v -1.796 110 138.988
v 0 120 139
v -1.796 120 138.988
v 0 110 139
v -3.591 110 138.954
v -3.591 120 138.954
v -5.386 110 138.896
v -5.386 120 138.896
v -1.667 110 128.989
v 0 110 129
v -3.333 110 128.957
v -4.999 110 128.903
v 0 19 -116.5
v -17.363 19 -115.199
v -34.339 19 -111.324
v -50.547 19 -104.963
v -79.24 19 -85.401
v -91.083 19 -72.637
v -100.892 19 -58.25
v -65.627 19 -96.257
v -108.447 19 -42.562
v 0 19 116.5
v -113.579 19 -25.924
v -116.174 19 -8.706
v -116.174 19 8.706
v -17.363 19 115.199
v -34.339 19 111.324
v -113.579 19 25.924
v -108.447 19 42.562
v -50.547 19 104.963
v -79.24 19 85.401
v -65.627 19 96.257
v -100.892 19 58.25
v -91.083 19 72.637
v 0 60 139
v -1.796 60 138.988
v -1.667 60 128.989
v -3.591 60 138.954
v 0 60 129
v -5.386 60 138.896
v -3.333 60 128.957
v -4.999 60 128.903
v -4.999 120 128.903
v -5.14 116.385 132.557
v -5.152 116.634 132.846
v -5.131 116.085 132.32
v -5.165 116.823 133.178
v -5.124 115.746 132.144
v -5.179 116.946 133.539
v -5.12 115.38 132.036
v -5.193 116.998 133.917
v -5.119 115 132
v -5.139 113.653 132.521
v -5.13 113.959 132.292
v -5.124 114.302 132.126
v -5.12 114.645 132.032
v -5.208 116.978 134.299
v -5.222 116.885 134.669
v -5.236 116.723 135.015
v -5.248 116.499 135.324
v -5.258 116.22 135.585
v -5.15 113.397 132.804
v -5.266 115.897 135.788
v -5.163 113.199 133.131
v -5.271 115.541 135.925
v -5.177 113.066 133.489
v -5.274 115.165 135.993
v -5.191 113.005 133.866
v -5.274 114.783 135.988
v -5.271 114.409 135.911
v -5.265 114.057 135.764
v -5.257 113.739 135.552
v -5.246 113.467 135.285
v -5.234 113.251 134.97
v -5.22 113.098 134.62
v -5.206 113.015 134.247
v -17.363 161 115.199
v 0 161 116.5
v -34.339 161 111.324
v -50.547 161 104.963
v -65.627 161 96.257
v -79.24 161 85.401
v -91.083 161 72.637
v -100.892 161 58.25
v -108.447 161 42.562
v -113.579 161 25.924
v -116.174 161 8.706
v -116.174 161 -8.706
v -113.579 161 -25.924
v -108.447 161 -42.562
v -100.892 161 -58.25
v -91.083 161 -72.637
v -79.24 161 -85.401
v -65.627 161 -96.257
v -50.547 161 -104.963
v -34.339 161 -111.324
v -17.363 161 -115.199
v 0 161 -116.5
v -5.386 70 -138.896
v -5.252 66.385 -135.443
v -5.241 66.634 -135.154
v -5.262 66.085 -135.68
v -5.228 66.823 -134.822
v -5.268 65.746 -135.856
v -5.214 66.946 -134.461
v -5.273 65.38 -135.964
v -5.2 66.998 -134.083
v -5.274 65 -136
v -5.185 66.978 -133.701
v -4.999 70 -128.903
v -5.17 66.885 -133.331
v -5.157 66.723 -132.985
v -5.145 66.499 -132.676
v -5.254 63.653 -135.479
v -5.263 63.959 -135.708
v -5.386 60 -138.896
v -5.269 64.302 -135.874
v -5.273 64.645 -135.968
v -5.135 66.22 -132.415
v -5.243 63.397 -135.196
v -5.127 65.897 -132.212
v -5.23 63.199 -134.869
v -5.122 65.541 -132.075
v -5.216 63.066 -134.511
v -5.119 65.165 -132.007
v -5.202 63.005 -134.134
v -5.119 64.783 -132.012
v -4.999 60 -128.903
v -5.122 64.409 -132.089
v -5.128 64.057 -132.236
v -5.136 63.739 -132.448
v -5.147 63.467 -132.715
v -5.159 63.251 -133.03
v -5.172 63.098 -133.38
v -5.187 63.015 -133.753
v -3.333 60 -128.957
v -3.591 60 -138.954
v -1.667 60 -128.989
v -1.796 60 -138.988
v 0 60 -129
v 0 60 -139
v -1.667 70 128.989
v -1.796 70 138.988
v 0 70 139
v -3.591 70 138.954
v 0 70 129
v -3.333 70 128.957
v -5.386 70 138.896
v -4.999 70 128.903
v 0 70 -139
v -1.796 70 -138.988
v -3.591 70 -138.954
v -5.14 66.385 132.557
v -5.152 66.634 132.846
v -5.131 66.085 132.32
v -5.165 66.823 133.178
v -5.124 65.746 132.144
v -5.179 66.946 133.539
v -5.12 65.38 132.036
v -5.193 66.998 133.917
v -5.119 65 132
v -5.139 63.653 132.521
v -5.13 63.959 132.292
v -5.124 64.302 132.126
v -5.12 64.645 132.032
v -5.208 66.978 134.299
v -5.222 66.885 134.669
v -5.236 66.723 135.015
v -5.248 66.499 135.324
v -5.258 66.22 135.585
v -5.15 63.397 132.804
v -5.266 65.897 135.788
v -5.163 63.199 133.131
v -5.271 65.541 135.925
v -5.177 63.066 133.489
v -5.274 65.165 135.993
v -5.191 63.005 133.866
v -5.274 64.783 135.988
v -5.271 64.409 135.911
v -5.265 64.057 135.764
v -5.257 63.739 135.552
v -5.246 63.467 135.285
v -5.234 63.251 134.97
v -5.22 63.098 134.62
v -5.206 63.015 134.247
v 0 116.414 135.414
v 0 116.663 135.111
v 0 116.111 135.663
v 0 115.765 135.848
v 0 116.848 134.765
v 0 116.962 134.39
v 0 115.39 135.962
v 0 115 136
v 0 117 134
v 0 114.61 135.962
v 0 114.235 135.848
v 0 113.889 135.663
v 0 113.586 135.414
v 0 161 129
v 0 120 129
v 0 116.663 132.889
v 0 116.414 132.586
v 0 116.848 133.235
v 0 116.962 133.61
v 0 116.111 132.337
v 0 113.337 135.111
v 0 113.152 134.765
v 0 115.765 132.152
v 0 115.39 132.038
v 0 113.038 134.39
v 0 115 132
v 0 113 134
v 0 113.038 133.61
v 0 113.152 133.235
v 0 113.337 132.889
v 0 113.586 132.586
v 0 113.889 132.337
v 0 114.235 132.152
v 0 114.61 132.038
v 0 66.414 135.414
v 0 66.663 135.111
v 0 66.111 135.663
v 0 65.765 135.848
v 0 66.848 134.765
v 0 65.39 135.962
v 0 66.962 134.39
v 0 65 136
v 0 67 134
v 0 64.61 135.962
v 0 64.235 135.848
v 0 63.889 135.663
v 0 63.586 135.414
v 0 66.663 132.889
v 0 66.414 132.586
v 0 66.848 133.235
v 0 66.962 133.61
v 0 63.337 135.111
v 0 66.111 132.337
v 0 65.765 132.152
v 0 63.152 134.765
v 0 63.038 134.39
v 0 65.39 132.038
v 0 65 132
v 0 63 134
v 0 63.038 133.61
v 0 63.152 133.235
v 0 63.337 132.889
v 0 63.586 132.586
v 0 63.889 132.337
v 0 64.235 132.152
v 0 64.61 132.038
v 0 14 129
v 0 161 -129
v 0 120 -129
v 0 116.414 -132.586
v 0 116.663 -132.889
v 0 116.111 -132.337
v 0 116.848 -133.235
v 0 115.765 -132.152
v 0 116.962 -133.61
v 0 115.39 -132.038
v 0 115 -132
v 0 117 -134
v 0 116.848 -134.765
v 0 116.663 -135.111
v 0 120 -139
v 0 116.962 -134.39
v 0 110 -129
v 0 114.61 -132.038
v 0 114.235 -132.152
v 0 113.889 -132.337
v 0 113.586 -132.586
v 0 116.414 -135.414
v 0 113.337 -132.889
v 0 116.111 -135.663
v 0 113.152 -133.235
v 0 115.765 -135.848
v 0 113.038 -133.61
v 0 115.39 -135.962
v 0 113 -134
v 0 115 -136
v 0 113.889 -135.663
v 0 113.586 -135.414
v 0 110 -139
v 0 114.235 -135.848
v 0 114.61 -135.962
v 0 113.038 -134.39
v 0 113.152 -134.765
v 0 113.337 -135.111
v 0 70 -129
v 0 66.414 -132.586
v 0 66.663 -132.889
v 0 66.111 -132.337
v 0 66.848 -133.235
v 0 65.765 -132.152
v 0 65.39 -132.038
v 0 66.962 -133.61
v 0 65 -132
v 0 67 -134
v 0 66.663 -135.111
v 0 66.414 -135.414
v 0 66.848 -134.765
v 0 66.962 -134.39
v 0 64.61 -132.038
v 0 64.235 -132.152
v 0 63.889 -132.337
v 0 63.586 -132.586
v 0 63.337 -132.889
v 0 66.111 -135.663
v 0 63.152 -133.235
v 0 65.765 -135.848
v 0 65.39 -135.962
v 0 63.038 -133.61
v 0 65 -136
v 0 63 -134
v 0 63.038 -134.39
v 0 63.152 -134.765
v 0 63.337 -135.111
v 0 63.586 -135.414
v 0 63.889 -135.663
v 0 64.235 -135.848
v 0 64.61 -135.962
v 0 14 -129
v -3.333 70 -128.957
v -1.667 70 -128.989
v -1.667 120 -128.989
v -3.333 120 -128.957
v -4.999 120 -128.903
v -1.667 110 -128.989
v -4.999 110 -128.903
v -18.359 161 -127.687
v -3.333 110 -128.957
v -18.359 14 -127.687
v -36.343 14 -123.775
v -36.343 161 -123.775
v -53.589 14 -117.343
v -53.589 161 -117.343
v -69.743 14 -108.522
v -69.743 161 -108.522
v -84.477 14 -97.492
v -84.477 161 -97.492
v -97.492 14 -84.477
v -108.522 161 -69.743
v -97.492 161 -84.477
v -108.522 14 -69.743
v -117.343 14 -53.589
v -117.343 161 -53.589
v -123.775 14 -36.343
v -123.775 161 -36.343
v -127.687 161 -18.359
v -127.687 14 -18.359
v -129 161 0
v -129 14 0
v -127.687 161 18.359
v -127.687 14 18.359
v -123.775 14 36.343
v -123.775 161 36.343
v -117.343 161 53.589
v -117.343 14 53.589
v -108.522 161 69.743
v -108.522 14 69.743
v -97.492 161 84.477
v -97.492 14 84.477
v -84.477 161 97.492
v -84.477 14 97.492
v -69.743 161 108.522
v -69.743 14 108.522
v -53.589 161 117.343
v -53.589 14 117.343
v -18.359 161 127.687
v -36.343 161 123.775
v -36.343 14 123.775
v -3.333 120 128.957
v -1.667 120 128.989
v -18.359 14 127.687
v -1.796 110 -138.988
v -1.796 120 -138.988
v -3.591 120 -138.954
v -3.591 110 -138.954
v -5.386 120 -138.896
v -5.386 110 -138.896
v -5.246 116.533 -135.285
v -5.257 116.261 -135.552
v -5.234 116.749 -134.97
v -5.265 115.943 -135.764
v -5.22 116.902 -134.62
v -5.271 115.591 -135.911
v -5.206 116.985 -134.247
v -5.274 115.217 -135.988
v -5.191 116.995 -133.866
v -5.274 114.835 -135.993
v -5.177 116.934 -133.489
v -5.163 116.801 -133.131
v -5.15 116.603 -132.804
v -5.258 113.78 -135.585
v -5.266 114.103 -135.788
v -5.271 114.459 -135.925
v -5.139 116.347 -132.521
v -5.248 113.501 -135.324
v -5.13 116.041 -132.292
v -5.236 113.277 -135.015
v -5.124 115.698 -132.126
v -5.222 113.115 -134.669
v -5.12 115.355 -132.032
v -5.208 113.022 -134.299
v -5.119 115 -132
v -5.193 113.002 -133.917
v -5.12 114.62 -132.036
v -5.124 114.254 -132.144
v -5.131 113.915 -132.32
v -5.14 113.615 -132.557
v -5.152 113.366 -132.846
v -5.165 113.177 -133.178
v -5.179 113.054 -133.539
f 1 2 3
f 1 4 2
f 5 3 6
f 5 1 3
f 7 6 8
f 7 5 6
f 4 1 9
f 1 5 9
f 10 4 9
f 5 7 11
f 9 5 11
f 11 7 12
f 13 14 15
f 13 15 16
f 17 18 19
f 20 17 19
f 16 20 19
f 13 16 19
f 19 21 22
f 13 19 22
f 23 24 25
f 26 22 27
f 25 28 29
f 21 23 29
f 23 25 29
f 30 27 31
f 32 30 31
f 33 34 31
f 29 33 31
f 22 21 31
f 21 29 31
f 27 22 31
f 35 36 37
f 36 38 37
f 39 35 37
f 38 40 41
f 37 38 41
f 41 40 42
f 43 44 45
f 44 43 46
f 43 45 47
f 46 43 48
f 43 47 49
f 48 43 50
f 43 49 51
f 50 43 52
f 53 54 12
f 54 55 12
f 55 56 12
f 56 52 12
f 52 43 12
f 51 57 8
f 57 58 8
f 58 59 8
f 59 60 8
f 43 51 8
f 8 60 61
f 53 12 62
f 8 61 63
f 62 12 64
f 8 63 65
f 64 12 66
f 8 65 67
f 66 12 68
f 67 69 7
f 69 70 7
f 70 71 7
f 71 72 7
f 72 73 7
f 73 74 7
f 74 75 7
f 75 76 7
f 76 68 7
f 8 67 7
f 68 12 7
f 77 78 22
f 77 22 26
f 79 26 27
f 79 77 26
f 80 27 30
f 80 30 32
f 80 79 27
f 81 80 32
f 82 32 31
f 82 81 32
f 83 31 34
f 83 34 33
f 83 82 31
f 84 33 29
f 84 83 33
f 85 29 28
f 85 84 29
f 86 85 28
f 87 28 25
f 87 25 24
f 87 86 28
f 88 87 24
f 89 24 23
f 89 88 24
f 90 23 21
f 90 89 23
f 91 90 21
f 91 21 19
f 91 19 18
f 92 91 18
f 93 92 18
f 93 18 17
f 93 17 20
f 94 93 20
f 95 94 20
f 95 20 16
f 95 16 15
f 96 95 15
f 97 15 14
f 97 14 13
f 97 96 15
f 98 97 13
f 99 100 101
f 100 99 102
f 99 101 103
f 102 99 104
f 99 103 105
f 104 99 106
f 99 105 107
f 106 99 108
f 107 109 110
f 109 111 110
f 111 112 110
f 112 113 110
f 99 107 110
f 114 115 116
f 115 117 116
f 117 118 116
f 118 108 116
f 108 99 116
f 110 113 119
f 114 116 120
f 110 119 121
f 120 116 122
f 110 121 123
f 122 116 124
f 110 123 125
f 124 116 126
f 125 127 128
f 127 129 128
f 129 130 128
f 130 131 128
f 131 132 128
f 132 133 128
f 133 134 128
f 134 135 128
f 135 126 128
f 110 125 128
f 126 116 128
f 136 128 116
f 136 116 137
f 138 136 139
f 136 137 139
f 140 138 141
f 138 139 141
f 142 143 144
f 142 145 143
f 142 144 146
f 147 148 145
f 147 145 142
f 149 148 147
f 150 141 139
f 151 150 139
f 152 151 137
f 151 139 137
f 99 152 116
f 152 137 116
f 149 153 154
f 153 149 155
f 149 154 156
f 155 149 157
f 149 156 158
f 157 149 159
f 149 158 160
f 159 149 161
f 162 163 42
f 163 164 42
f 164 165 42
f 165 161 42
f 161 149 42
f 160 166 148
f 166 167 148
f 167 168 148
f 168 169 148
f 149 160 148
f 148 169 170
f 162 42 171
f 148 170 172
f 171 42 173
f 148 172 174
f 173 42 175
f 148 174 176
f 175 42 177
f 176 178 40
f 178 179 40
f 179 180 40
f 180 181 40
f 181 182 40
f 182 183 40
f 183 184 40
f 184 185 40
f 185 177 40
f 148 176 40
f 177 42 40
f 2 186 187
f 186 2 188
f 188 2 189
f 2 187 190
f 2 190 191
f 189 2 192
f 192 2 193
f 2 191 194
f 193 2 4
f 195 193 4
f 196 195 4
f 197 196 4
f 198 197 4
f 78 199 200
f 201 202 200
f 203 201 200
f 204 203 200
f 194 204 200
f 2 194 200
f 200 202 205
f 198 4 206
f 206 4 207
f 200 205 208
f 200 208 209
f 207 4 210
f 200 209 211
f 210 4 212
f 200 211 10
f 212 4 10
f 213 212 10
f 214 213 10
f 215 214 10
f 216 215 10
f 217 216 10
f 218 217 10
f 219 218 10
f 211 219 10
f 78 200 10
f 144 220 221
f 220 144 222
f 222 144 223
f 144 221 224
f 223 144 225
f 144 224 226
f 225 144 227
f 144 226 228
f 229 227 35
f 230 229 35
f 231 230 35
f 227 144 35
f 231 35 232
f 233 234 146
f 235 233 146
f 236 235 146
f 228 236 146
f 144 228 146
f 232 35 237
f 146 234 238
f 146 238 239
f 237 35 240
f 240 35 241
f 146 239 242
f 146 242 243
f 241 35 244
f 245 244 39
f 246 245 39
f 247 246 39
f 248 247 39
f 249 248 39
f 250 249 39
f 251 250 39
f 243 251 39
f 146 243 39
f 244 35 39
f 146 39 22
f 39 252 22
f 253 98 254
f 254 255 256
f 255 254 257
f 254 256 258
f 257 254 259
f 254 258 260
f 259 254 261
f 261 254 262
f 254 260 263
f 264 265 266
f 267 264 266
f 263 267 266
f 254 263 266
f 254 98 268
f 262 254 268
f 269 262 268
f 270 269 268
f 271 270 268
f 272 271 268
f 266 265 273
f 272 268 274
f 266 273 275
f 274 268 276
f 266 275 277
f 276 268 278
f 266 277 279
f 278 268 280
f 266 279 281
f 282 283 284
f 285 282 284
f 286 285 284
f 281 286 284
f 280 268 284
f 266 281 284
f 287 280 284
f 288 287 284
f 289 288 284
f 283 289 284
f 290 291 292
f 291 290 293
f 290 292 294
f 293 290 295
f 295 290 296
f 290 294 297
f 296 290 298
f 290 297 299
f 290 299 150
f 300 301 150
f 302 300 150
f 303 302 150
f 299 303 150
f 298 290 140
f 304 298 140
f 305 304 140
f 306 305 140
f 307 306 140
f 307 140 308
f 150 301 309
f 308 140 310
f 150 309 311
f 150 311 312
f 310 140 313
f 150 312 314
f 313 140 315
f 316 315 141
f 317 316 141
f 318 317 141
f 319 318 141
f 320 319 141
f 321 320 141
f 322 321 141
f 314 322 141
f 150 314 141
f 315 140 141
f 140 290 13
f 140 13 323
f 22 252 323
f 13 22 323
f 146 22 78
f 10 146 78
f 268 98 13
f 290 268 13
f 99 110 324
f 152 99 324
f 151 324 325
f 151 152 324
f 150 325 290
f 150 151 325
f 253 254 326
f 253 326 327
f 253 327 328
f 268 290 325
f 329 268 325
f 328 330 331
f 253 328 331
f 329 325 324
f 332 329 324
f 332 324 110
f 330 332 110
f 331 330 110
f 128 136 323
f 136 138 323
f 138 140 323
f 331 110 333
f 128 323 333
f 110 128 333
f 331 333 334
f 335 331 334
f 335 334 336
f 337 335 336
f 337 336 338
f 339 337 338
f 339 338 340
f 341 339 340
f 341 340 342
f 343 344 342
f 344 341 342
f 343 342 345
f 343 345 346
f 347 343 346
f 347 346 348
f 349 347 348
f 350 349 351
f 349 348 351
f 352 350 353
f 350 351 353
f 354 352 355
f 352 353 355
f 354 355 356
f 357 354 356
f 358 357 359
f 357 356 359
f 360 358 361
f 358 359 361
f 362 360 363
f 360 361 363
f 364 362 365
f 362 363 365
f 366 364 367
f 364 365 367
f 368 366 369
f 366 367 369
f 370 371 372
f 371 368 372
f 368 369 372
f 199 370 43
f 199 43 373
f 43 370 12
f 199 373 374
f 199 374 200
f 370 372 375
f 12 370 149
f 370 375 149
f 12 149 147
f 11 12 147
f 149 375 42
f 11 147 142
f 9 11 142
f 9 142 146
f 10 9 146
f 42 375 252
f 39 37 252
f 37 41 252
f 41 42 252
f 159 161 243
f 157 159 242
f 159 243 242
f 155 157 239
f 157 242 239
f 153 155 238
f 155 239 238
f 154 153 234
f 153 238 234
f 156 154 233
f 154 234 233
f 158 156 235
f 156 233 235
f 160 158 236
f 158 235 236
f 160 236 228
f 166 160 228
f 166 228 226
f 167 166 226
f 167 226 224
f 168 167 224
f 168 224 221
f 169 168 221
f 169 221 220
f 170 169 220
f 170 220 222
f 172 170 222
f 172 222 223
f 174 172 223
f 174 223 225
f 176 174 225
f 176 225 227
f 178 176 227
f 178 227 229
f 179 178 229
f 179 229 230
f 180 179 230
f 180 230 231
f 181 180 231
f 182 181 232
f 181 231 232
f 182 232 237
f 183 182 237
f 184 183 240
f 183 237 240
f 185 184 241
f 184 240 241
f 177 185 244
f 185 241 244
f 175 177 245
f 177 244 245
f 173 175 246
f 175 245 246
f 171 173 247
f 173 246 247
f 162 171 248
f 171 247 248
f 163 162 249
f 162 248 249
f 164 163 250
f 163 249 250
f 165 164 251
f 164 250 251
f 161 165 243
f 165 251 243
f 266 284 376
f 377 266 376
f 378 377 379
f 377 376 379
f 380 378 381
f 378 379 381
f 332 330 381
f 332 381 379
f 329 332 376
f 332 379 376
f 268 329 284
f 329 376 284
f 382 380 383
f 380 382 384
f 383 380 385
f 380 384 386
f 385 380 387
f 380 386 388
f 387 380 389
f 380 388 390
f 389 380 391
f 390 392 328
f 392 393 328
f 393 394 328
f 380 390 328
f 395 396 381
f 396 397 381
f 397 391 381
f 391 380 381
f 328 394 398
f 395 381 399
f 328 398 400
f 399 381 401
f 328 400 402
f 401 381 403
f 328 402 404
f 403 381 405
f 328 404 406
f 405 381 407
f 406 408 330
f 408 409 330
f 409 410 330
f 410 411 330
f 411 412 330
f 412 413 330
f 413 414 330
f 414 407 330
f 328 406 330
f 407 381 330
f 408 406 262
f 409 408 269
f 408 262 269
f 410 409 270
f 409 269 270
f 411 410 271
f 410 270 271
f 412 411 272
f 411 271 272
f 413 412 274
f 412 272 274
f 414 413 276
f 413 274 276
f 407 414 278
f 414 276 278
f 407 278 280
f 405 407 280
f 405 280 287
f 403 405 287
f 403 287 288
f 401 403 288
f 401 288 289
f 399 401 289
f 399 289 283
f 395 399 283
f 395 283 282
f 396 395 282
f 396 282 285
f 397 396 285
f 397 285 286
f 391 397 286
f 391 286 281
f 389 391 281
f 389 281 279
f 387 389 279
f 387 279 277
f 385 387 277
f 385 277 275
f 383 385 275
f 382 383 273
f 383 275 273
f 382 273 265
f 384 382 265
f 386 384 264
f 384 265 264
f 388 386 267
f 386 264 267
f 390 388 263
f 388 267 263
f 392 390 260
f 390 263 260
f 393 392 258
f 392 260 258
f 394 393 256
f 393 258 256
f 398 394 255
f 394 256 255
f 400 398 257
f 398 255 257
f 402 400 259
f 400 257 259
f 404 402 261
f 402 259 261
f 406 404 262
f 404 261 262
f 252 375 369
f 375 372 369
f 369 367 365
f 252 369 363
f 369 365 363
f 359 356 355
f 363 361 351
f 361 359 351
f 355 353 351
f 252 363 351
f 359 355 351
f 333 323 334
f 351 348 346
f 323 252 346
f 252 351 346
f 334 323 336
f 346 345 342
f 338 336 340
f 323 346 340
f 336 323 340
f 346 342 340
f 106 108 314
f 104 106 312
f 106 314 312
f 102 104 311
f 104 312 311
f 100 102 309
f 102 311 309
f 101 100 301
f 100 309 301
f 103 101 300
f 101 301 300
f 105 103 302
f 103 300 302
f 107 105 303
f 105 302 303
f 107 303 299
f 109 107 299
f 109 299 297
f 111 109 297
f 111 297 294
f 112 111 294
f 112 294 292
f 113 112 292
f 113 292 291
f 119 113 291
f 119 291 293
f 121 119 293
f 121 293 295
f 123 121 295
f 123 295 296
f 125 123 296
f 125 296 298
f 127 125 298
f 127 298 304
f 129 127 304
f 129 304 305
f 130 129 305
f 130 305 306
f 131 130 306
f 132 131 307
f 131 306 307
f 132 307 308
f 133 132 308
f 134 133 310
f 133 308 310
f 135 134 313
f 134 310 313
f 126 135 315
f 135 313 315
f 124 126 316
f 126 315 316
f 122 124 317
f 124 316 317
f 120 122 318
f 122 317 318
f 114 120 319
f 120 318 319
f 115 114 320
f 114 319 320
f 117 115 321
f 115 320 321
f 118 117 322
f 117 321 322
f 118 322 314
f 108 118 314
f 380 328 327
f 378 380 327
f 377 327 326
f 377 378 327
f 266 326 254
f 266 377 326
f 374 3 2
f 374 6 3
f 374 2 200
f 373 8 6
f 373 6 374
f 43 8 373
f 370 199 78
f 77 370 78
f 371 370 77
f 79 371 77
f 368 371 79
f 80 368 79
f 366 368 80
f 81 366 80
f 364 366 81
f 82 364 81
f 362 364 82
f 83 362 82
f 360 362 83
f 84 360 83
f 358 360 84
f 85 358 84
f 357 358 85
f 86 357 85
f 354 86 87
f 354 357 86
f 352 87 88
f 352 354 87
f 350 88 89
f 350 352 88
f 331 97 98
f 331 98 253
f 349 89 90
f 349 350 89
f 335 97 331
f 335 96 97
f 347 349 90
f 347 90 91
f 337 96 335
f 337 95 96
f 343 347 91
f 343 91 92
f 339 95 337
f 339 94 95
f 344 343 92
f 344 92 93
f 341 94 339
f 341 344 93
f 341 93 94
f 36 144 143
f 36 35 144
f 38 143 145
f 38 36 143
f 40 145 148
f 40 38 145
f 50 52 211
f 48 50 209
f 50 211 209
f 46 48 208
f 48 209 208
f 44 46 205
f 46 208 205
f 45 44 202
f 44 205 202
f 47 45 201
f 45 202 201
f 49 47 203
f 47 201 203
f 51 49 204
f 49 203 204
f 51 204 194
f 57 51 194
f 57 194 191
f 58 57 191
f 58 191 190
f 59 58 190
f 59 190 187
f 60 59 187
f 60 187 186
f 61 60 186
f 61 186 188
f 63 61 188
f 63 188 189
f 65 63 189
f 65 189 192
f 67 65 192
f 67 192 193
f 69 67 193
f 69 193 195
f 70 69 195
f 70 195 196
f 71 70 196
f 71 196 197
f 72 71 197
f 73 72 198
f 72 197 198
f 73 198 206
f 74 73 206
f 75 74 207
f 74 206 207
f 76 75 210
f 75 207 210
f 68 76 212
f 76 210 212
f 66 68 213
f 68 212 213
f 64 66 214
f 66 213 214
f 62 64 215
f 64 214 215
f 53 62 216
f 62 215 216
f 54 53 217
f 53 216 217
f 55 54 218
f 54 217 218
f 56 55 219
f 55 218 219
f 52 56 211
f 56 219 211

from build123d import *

# Parameters (mm, degrees)
BOSS_EXTRUDE1_DEPTH      = 180
SKETCH3_W                = 116.5
SKETCH3_H                = 142
CUT_REVOLVE1_ANGLE       = 271
WRAP1_SECTION_W          = 10
WRAP1_SECTION_H          = 10
WRAP1_ANGLE              = 2.220766648
WRAP1_SECTOR_2_SECTION_W = 10
WRAP1_SECTOR_2_SECTION_H = 10
WRAP1_SECTOR_2_ANGLE     = 2.220766648
MIRROR1_START            = 60
MIRROR1_DEPTH            = 10
MIRROR1_START_2          = 110
MIRROR1_2_DEPTH          = 10
CUT_EXTRUDE6_DEPTH       = 262.461278204
CUT_EXTRUDE6_DEPTH_BACK  = 20
SKETCH17_R               = 2
CUT_EXTRUDE7_DEPTH       = 10
CUT_EXTRUDE9_DEPTH       = 262.461278204
CUT_EXTRUDE9_DEPTH_BACK  = 262.461278204
SKETCH19_W               = 258
SKETCH19_H               = 15.225908702
CUT_EXTRUDE10_DEPTH      = 252.222015682
CUT_EXTRUDE10_DEPTH_BACK = 252.222015682
SKETCH22_W               = 258
SKETCH22_H               = 14
SKETCH22_H_2             = 3.774091298


# Read off the part's stored shape, not the designer's step: Mirror1
with BuildPart() as part:
    # Sketch1 → Boss-Extrude1 (new body)
    with BuildSketch(Plane(origin=(0, 0, 0), x_dir=(1, 0, 0), z_dir=(0, 1, 0))):
        with BuildLine():
            Line((0, -129), (0, 129))
            ThreePointArc((0, 129), (-129, 0), (0, -129))
        make_face()
    extrude(amount=BOSS_EXTRUDE1_DEPTH)

    # Sketch3 → Cut-Revolve1 (revolve, cut)
    with BuildSketch(Plane(origin=(0, 0, 0), x_dir=(0, 0, -1), z_dir=(1, 0, 0))):
        with Locations((-58.25, 90)):
            Rectangle(SKETCH3_W, SKETCH3_H)
    revolve(axis=Axis((0, 180, 0), (0, -1, 0)), revolution_arc=CUT_REVOLVE1_ANGLE, mode=Mode.SUBTRACT)

    # Wrap1 section (on wrap section) → Wrap1 (revolve)
    with BuildSketch(Plane(origin=(0, 0, 0), x_dir=(0, 0, 1), z_dir=(1, 0, 0))):
        with Locations((134, -115)):
            Rectangle(WRAP1_SECTION_W, WRAP1_SECTION_H)
    revolve(axis=Axis((0, 0, 0), (0, -1, 0)), revolution_arc=WRAP1_ANGLE)

    # Wrap1 sector 2 section (on wrap section) → Wrap1 sector 2 (revolve)
    with BuildSketch(Plane(origin=(0, 0, 0), x_dir=(0, 0, 1), z_dir=(1, 0, 0))):
        with Locations((134, -65)):
            Rectangle(WRAP1_SECTOR_2_SECTION_W, WRAP1_SECTOR_2_SECTION_H)
    revolve(axis=Axis((0, 0, 0), (0, -1, 0)), revolution_arc=WRAP1_SECTOR_2_ANGLE)

    # Mirror1 outline → Mirror1 (add)
    with BuildSketch(Plane(origin=(0, 0, 0), x_dir=(1, 0, 0), z_dir=(0, 1, 0)).offset(MIRROR1_START)):
        with BuildLine():
            ThreePointArc((0, 139), (-2.693629831, 138.973898119), (-5.386248024, 138.895602278))
            Line((-5.386248024, 138.895602278), (-4.998748166, 128.903112906))
            ThreePointArc((-4.998748166, 128.903112906), (-2.499843512, 128.975775952), (0, 129))
            Line((0, 129), (0, 139))
        make_face()
    extrude(amount=MIRROR1_DEPTH)

    # Mirror1 2 outline → Mirror1 2 (add)
    with BuildSketch(Plane(origin=(0, 0, 0), x_dir=(1, 0, 0), z_dir=(0, 1, 0)).offset(MIRROR1_START_2)):
        with BuildLine():
            ThreePointArc((0, 139), (-2.693629831, 138.973898119), (-5.386248024, 138.895602278))
            Line((-5.386248024, 138.895602278), (-4.998748166, 128.903112906))
            ThreePointArc((-4.998748166, 128.903112906), (-2.499843512, 128.975775952), (0, 129))
            Line((0, 129), (0, 139))
        make_face()
    extrude(amount=MIRROR1_2_DEPTH)

    # Sketch16 → Cut-Extrude6 (cut, two sides: drawn at the far end of the back side and taken through both)
    with BuildSketch(Plane(origin=(0, 180, 0), x_dir=(1, 0, 0), z_dir=(0, 1, 0)).offset(-CUT_EXTRUDE6_DEPTH_BACK)):
        with BuildLine():
            Line((0, 100), (0, -100))
            ThreePointArc((0, -100), (-100, 0), (0, 100))
        make_face()
    extrude(amount=CUT_EXTRUDE6_DEPTH + CUT_EXTRUDE6_DEPTH_BACK, mode=Mode.SUBTRACT)

    # Sketch17 → Cut-Extrude7 (cut)
    with BuildSketch(Plane(origin=(0, 0, 0), x_dir=(0, 0, -1), z_dir=(1, 0, 0))):
        with Locations((-134, 115)):
            Circle(SKETCH17_R)
        with Locations((-134, 65)):
            Circle(SKETCH17_R)
        with Locations(Location((134, 115, 0), (0, 0, 180))):
            Circle(SKETCH17_R)
        with Locations((134, 65)):
            Circle(SKETCH17_R)
    extrude(amount=-CUT_EXTRUDE7_DEPTH, mode=Mode.SUBTRACT)

    # Sketch19 → Cut-Extrude9 (cut, two sides: drawn at the far end of the back side and taken through both)
    with BuildSketch(Plane(origin=(0, 0, 0), x_dir=(0, 0, -1), z_dir=(1, 0, 0)).offset(-CUT_EXTRUDE9_DEPTH_BACK)):
        with Locations((0, 172.387045649)):
            Rectangle(SKETCH19_W, SKETCH19_H)
    extrude(amount=CUT_EXTRUDE9_DEPTH + CUT_EXTRUDE9_DEPTH_BACK, mode=Mode.SUBTRACT)

    # Sketch22 → Cut-Extrude10 (cut, two sides: drawn at the far end of the back side and taken through both)
    with BuildSketch(Plane(origin=(0, 0, 0), x_dir=(0, 0, -1), z_dir=(1, 0, 0)).offset(-CUT_EXTRUDE10_DEPTH_BACK)):
        with Locations((0, 7)):
            Rectangle(SKETCH22_W, SKETCH22_H)
        with Locations((0, 162.887045649)):
            Rectangle(SKETCH22_W, SKETCH22_H_2)
    extrude(amount=CUT_EXTRUDE10_DEPTH + CUT_EXTRUDE10_DEPTH_BACK, mode=Mode.SUBTRACT)


solid = part.part
